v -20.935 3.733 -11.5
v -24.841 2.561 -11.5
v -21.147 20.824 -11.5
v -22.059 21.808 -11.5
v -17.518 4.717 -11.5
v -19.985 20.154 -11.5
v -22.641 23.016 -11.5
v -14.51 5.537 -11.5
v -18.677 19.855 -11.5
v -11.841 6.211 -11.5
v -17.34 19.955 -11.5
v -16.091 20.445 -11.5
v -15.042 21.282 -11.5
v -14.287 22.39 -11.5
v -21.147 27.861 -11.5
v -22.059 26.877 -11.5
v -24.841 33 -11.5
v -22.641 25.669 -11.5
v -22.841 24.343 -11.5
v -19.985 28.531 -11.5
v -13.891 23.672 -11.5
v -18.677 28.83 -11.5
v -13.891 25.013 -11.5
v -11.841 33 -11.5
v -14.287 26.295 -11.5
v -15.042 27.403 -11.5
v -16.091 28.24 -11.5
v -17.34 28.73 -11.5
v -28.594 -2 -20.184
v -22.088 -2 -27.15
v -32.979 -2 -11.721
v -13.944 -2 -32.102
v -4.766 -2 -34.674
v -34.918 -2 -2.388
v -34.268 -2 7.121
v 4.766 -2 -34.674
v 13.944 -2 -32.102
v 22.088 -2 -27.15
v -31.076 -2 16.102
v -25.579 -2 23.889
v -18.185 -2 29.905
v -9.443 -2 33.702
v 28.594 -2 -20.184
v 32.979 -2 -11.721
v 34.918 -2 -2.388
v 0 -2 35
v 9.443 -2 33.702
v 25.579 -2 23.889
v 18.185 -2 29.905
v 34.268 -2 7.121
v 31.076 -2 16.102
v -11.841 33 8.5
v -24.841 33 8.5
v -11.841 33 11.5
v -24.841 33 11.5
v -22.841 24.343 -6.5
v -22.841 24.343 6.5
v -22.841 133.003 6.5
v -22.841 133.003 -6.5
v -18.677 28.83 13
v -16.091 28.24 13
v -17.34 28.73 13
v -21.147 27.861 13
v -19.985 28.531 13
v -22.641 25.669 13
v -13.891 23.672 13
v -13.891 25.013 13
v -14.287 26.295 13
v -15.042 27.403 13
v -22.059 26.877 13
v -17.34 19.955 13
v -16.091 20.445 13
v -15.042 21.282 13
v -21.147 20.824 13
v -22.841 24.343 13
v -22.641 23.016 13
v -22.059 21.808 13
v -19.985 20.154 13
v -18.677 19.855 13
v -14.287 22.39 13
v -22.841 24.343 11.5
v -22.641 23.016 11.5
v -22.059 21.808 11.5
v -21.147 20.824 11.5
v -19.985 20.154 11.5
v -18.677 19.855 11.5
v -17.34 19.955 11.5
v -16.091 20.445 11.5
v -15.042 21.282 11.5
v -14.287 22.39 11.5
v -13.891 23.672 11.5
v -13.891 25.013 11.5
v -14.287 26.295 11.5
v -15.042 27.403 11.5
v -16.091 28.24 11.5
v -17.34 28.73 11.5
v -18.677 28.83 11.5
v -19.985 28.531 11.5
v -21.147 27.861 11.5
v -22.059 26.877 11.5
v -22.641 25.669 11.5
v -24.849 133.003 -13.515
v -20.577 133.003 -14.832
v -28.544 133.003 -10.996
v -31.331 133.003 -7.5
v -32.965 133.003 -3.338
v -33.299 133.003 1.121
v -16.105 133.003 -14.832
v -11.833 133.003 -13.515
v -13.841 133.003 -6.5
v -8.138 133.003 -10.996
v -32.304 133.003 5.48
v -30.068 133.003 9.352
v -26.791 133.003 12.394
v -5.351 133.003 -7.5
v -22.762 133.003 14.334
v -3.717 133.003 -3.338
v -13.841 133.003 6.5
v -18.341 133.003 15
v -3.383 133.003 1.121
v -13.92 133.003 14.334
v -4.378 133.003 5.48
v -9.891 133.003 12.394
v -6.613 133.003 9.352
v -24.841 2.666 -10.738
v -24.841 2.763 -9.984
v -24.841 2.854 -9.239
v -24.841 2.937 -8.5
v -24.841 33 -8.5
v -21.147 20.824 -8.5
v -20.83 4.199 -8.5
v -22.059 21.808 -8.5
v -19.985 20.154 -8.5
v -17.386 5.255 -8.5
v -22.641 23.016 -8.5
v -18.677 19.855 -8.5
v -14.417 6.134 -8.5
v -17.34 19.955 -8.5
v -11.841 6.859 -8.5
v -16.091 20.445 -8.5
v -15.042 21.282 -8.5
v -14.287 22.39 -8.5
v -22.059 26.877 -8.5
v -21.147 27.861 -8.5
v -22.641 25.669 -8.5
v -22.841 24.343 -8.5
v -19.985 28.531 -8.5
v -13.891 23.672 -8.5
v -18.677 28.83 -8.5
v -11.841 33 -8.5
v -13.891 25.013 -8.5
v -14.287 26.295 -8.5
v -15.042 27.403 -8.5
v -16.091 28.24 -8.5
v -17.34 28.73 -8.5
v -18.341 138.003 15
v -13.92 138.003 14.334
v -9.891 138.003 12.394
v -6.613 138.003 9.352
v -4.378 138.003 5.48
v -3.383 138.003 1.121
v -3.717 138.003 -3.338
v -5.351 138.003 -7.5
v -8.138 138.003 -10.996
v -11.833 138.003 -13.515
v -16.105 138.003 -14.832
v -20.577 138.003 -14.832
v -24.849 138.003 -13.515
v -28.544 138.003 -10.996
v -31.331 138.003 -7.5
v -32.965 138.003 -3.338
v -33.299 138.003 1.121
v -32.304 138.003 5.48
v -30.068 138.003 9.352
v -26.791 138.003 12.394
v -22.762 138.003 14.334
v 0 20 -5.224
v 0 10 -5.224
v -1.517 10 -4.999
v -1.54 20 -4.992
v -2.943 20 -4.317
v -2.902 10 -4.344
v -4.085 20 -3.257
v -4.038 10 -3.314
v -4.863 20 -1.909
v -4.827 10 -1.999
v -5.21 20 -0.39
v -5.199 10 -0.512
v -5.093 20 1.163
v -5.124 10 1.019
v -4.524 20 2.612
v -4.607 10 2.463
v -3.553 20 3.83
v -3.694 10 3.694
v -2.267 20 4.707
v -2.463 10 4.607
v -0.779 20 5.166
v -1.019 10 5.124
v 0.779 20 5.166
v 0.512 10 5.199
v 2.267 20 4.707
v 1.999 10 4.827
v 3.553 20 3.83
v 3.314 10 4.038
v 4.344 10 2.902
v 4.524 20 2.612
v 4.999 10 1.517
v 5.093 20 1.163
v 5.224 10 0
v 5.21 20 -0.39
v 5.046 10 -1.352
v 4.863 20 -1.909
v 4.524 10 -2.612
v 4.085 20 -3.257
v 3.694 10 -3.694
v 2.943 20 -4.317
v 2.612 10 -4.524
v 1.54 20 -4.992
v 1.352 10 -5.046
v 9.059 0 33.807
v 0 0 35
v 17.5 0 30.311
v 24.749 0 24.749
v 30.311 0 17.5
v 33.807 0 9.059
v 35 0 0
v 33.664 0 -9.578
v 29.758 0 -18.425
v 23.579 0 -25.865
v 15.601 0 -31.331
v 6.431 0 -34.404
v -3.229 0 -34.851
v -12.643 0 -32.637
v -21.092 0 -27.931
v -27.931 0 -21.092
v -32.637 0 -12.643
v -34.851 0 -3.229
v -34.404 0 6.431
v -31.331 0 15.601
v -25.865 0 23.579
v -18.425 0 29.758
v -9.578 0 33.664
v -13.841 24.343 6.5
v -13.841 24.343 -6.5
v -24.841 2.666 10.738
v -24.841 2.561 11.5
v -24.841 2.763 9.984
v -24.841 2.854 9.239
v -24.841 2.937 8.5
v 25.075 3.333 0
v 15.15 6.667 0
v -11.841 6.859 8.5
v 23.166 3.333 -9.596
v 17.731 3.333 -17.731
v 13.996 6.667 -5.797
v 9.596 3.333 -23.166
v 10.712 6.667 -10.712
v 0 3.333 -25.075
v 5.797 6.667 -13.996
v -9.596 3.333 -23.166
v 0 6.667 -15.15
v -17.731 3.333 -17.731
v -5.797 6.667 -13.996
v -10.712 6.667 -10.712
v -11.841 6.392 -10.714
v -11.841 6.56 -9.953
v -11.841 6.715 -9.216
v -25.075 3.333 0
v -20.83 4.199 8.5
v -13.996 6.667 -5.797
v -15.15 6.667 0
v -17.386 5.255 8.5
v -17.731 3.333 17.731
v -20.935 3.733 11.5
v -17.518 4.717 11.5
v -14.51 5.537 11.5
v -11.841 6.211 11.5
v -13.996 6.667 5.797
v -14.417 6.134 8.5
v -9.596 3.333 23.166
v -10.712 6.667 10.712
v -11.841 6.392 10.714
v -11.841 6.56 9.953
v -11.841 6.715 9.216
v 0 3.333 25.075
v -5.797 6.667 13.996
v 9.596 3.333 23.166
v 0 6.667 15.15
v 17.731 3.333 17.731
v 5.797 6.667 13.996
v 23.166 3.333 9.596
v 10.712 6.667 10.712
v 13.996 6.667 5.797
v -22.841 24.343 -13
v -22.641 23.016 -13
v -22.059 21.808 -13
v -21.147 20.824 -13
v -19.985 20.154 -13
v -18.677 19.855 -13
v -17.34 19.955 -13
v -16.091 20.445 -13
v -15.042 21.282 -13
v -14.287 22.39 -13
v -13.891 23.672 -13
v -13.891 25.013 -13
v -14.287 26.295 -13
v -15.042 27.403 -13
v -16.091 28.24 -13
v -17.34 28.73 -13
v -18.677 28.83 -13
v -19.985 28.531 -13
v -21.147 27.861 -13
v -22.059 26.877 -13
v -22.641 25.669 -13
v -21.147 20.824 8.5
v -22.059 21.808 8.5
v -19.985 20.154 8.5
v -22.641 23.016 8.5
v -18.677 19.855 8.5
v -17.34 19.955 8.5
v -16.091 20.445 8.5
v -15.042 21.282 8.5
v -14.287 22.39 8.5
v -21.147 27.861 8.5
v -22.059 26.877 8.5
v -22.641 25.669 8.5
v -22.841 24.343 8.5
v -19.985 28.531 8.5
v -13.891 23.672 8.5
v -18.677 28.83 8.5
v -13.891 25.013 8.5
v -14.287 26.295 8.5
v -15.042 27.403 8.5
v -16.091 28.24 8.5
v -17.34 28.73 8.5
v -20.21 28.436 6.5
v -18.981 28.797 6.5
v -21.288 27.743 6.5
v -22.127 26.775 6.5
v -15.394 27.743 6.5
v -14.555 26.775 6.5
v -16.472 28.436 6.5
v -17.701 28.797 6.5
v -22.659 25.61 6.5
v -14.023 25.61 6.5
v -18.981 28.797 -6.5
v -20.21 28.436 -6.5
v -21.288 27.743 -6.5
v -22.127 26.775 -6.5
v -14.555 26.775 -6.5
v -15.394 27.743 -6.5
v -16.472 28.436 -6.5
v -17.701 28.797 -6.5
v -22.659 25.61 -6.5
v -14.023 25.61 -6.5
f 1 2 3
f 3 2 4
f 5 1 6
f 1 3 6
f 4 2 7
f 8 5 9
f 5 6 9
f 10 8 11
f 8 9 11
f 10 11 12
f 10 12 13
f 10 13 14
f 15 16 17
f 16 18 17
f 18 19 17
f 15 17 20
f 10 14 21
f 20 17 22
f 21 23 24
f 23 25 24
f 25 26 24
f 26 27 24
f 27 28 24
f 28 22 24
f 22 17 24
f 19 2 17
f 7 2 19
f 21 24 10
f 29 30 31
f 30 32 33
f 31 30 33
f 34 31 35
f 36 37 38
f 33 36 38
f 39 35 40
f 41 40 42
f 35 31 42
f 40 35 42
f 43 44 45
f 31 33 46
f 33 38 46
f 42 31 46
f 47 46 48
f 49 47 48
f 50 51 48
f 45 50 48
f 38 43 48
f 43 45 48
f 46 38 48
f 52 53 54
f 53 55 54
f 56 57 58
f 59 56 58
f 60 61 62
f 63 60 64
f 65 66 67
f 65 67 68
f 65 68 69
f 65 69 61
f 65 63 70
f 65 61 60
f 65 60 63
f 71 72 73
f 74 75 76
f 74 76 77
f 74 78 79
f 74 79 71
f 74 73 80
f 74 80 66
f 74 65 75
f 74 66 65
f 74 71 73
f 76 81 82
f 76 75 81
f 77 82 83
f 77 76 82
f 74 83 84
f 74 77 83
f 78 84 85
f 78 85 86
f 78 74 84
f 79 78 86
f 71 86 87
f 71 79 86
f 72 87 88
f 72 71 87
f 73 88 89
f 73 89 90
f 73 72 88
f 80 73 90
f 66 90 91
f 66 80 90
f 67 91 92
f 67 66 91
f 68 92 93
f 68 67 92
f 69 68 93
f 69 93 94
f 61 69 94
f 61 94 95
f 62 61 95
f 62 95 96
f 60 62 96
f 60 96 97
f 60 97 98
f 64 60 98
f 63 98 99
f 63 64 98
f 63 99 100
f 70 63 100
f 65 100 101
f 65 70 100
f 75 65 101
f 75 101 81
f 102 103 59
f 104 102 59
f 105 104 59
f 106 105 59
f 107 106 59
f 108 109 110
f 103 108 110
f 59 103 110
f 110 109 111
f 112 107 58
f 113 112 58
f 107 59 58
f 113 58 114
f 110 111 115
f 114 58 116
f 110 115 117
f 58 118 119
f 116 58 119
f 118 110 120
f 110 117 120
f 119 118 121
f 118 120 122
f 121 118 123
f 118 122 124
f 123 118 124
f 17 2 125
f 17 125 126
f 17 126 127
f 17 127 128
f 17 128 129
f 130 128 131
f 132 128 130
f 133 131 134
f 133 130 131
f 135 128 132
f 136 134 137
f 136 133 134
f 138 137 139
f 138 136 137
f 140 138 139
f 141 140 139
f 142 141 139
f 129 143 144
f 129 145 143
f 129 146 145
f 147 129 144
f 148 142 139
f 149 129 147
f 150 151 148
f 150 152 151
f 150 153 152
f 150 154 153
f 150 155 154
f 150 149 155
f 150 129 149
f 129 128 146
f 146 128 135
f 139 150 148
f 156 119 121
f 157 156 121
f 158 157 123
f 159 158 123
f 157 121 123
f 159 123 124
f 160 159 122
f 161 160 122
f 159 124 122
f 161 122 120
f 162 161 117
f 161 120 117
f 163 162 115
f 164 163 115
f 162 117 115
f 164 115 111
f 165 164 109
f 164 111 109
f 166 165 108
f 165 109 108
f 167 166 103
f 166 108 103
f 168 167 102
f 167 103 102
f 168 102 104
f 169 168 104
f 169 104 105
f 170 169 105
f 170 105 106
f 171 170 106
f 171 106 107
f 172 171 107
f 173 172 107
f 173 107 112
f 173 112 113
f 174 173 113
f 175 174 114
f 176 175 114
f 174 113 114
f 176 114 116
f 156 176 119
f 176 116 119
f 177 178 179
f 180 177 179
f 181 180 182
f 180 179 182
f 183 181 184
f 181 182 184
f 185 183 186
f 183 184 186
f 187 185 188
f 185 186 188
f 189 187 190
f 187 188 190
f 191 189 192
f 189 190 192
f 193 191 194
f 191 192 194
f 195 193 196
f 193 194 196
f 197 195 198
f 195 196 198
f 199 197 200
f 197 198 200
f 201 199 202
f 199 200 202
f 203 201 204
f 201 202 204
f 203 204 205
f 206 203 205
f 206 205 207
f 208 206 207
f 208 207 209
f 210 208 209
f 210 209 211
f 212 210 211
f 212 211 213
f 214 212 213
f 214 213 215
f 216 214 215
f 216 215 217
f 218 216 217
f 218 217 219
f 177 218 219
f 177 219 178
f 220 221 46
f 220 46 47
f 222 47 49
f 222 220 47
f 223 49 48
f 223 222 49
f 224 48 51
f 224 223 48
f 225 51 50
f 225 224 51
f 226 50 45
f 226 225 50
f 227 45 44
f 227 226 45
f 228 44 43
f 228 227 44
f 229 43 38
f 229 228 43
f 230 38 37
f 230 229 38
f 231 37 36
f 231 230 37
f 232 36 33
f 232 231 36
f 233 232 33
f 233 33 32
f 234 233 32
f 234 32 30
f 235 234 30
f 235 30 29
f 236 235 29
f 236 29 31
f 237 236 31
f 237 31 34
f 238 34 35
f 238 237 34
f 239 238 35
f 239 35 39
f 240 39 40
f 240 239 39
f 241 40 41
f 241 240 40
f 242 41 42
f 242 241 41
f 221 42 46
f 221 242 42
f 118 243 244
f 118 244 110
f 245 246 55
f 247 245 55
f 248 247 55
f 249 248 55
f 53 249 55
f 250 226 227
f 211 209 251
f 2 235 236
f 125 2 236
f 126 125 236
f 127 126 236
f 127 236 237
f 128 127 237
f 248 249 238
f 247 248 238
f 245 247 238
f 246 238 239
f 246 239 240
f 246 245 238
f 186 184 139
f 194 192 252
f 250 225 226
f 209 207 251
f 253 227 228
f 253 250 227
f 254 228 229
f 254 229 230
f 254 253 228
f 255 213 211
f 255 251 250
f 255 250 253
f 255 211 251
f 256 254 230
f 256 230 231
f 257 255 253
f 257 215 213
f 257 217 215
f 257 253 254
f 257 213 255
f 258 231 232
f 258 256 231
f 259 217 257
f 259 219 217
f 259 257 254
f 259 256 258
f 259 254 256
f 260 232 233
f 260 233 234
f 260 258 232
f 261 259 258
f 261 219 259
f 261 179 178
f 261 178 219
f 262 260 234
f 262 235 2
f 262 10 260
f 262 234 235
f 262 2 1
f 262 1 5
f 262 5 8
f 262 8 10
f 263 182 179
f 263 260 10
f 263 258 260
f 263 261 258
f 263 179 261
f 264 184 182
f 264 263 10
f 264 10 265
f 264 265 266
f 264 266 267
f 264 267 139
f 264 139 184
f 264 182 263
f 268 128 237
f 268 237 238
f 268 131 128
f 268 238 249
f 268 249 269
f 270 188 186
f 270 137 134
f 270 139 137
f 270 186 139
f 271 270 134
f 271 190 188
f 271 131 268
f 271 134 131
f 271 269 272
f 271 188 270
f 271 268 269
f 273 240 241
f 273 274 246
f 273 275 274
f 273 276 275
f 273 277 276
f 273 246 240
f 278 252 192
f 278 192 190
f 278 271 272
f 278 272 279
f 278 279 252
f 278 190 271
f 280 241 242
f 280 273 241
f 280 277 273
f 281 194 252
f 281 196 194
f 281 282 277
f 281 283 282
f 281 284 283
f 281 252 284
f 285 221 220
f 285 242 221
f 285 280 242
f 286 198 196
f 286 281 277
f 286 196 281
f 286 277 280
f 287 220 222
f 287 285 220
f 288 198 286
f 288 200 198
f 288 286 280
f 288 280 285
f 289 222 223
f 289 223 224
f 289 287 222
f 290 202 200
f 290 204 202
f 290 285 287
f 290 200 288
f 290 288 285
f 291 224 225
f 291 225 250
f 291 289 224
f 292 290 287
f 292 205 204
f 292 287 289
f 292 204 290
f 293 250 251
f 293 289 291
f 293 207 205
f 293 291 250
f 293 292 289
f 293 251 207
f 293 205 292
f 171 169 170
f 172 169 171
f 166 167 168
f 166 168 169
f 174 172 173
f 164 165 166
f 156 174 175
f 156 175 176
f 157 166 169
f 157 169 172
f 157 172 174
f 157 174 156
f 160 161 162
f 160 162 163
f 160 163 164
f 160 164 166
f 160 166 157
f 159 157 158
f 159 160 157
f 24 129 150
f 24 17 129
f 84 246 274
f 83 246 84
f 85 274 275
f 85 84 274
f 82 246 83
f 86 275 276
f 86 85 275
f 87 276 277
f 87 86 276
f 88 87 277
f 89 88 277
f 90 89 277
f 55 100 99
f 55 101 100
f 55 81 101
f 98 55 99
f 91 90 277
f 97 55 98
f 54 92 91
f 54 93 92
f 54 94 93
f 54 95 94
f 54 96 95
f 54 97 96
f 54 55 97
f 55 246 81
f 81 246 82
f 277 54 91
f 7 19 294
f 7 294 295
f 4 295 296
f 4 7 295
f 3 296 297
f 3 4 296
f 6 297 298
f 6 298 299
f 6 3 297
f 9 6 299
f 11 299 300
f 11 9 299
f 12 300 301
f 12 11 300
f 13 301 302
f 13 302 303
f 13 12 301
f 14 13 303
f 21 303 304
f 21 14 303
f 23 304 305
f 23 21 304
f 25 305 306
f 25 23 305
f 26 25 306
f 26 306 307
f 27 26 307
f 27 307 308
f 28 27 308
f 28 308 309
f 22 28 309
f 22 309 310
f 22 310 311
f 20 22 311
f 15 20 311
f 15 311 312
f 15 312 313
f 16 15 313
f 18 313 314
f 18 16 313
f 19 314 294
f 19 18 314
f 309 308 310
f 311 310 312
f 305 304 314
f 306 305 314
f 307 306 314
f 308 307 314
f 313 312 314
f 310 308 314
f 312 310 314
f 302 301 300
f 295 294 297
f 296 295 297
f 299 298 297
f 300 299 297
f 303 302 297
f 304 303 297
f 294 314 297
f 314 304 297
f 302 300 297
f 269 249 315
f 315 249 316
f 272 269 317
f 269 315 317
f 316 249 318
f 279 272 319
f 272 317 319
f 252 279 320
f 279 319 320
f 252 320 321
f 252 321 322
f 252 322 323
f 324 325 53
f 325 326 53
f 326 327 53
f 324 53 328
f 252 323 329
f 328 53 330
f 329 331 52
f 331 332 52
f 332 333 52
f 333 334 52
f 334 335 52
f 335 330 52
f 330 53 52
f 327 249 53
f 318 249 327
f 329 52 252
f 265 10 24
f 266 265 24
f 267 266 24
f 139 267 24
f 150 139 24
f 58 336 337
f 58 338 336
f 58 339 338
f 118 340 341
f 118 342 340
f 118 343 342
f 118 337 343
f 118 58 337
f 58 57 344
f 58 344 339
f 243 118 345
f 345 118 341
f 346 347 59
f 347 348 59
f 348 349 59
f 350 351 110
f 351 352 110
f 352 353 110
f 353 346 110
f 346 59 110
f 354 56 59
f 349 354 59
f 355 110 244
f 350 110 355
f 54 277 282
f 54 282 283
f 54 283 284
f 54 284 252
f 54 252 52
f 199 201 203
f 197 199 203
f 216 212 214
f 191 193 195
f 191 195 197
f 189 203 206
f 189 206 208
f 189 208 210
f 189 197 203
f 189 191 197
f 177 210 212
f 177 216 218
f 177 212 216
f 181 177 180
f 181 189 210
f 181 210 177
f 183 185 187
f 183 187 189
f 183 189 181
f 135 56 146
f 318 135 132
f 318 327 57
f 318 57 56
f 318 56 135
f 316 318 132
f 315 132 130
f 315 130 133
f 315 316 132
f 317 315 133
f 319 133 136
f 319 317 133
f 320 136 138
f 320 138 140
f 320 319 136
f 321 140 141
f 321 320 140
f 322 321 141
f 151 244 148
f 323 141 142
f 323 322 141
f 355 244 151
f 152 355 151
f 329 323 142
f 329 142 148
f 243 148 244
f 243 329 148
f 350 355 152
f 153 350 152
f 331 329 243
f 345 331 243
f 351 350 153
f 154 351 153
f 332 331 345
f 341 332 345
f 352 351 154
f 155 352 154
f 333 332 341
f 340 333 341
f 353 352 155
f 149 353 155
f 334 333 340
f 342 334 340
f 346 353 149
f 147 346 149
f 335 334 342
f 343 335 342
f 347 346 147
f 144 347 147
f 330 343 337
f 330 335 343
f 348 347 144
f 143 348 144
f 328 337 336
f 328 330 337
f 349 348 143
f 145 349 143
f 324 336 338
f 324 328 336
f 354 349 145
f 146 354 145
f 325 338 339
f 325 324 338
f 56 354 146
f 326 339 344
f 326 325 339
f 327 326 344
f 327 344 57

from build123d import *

# Parameters (mm, degrees)
SKETCH1_R           = 35
SKETCH2_R           = 5.224283628
SKETCH8_R           = 5.224283628
BOSS_EXTRUDE1_DEPTH = 10
SKETCH16_W          = 13
SKETCH16_H          = 33
BOSS_EXTRUDE5_DEPTH = 1.5
SKETCH19_R          = 4.5
BOSS_EXTRUDE6_DEPTH = 13
SKETCH21_W          = 9
SKETCH21_H          = 108.66
BOSS_EXTRUDE7_DEPTH = 6.5
SKETCH22_R          = 35
BOSS_EXTRUDE8_DEPTH = 2
SKETCH23_R          = 15
BOSS_EXTRUDE9_DEPTH = 5


with BuildPart() as part:
    # Sketch1 → Loft3 section 0
    with BuildSketch(Plane(origin=(0, 0, 0), x_dir=(1, 0, 0), z_dir=(0, 1, 0))):
        Circle(SKETCH1_R)
    # Sketch2 → Loft3 section 1
    with BuildSketch(Plane(origin=(0, 10, 0), x_dir=(1, 0, 0), z_dir=(0, 1, 0))):
        Circle(SKETCH2_R)
    loft()

    # Sketch8 → Boss-Extrude1 (add)
    with BuildSketch(Plane(origin=(0, 10, 0), x_dir=(1, 0, 0), z_dir=(0, 1, 0))):
        with Locations(Location((0, 0, 0), (0, 0, 90))):
            Circle(SKETCH8_R)
    extrude(amount=BOSS_EXTRUDE1_DEPTH)

    # Sketch16 → Boss-Extrude5 (add, symmetric)
    with BuildSketch(Plane.XY.offset(10)):
        with Locations((-18.340938927, 16.5)):
            Rectangle(SKETCH16_W, SKETCH16_H)
    boss_extrude5 = extrude(amount=BOSS_EXTRUDE5_DEPTH, both=True)

    # Mirror2: Boss-Extrude5 across plane
    add(boss_extrude5.mirror(Plane.XY))

    # Sketch19 → Boss-Extrude6 (add, symmetric)
    with BuildSketch(Plane.XY):
        with Locations(Location((-18.340938927, 24.342530905, 0), (0, 0, 180))):
            Circle(SKETCH19_R)
    extrude(amount=BOSS_EXTRUDE6_DEPTH, both=True)

    # Sketch21 → Boss-Extrude7 (add, symmetric)
    with BuildSketch(Plane.XY):
        with Locations((-18.340938927, 78.672530905)):
            Rectangle(SKETCH21_W, SKETCH21_H)
    extrude(amount=BOSS_EXTRUDE7_DEPTH, both=True)

    # Sketch22 → Boss-Extrude8 (add)
    with BuildSketch(Plane(origin=(0, 0, 0), x_dir=(1, 0, 0), z_dir=(0, 1, 0))):
        with Locations(Location((0, 0, 0), (0, 0, 270))):
            Circle(SKETCH22_R)
    extrude(amount=-BOSS_EXTRUDE8_DEPTH)

    # Sketch23 → Boss-Extrude9 (add)
    with BuildSketch(Plane(origin=(0, 133.002530905, 0), x_dir=(1, 0, 0), z_dir=(0, 1, 0))):
        with Locations(Location((-18.340938927, 0, 0), (0, 0, 270))):
            Circle(SKETCH23_R)
    extrude(amount=BOSS_EXTRUDE9_DEPTH)


solid = part.part
